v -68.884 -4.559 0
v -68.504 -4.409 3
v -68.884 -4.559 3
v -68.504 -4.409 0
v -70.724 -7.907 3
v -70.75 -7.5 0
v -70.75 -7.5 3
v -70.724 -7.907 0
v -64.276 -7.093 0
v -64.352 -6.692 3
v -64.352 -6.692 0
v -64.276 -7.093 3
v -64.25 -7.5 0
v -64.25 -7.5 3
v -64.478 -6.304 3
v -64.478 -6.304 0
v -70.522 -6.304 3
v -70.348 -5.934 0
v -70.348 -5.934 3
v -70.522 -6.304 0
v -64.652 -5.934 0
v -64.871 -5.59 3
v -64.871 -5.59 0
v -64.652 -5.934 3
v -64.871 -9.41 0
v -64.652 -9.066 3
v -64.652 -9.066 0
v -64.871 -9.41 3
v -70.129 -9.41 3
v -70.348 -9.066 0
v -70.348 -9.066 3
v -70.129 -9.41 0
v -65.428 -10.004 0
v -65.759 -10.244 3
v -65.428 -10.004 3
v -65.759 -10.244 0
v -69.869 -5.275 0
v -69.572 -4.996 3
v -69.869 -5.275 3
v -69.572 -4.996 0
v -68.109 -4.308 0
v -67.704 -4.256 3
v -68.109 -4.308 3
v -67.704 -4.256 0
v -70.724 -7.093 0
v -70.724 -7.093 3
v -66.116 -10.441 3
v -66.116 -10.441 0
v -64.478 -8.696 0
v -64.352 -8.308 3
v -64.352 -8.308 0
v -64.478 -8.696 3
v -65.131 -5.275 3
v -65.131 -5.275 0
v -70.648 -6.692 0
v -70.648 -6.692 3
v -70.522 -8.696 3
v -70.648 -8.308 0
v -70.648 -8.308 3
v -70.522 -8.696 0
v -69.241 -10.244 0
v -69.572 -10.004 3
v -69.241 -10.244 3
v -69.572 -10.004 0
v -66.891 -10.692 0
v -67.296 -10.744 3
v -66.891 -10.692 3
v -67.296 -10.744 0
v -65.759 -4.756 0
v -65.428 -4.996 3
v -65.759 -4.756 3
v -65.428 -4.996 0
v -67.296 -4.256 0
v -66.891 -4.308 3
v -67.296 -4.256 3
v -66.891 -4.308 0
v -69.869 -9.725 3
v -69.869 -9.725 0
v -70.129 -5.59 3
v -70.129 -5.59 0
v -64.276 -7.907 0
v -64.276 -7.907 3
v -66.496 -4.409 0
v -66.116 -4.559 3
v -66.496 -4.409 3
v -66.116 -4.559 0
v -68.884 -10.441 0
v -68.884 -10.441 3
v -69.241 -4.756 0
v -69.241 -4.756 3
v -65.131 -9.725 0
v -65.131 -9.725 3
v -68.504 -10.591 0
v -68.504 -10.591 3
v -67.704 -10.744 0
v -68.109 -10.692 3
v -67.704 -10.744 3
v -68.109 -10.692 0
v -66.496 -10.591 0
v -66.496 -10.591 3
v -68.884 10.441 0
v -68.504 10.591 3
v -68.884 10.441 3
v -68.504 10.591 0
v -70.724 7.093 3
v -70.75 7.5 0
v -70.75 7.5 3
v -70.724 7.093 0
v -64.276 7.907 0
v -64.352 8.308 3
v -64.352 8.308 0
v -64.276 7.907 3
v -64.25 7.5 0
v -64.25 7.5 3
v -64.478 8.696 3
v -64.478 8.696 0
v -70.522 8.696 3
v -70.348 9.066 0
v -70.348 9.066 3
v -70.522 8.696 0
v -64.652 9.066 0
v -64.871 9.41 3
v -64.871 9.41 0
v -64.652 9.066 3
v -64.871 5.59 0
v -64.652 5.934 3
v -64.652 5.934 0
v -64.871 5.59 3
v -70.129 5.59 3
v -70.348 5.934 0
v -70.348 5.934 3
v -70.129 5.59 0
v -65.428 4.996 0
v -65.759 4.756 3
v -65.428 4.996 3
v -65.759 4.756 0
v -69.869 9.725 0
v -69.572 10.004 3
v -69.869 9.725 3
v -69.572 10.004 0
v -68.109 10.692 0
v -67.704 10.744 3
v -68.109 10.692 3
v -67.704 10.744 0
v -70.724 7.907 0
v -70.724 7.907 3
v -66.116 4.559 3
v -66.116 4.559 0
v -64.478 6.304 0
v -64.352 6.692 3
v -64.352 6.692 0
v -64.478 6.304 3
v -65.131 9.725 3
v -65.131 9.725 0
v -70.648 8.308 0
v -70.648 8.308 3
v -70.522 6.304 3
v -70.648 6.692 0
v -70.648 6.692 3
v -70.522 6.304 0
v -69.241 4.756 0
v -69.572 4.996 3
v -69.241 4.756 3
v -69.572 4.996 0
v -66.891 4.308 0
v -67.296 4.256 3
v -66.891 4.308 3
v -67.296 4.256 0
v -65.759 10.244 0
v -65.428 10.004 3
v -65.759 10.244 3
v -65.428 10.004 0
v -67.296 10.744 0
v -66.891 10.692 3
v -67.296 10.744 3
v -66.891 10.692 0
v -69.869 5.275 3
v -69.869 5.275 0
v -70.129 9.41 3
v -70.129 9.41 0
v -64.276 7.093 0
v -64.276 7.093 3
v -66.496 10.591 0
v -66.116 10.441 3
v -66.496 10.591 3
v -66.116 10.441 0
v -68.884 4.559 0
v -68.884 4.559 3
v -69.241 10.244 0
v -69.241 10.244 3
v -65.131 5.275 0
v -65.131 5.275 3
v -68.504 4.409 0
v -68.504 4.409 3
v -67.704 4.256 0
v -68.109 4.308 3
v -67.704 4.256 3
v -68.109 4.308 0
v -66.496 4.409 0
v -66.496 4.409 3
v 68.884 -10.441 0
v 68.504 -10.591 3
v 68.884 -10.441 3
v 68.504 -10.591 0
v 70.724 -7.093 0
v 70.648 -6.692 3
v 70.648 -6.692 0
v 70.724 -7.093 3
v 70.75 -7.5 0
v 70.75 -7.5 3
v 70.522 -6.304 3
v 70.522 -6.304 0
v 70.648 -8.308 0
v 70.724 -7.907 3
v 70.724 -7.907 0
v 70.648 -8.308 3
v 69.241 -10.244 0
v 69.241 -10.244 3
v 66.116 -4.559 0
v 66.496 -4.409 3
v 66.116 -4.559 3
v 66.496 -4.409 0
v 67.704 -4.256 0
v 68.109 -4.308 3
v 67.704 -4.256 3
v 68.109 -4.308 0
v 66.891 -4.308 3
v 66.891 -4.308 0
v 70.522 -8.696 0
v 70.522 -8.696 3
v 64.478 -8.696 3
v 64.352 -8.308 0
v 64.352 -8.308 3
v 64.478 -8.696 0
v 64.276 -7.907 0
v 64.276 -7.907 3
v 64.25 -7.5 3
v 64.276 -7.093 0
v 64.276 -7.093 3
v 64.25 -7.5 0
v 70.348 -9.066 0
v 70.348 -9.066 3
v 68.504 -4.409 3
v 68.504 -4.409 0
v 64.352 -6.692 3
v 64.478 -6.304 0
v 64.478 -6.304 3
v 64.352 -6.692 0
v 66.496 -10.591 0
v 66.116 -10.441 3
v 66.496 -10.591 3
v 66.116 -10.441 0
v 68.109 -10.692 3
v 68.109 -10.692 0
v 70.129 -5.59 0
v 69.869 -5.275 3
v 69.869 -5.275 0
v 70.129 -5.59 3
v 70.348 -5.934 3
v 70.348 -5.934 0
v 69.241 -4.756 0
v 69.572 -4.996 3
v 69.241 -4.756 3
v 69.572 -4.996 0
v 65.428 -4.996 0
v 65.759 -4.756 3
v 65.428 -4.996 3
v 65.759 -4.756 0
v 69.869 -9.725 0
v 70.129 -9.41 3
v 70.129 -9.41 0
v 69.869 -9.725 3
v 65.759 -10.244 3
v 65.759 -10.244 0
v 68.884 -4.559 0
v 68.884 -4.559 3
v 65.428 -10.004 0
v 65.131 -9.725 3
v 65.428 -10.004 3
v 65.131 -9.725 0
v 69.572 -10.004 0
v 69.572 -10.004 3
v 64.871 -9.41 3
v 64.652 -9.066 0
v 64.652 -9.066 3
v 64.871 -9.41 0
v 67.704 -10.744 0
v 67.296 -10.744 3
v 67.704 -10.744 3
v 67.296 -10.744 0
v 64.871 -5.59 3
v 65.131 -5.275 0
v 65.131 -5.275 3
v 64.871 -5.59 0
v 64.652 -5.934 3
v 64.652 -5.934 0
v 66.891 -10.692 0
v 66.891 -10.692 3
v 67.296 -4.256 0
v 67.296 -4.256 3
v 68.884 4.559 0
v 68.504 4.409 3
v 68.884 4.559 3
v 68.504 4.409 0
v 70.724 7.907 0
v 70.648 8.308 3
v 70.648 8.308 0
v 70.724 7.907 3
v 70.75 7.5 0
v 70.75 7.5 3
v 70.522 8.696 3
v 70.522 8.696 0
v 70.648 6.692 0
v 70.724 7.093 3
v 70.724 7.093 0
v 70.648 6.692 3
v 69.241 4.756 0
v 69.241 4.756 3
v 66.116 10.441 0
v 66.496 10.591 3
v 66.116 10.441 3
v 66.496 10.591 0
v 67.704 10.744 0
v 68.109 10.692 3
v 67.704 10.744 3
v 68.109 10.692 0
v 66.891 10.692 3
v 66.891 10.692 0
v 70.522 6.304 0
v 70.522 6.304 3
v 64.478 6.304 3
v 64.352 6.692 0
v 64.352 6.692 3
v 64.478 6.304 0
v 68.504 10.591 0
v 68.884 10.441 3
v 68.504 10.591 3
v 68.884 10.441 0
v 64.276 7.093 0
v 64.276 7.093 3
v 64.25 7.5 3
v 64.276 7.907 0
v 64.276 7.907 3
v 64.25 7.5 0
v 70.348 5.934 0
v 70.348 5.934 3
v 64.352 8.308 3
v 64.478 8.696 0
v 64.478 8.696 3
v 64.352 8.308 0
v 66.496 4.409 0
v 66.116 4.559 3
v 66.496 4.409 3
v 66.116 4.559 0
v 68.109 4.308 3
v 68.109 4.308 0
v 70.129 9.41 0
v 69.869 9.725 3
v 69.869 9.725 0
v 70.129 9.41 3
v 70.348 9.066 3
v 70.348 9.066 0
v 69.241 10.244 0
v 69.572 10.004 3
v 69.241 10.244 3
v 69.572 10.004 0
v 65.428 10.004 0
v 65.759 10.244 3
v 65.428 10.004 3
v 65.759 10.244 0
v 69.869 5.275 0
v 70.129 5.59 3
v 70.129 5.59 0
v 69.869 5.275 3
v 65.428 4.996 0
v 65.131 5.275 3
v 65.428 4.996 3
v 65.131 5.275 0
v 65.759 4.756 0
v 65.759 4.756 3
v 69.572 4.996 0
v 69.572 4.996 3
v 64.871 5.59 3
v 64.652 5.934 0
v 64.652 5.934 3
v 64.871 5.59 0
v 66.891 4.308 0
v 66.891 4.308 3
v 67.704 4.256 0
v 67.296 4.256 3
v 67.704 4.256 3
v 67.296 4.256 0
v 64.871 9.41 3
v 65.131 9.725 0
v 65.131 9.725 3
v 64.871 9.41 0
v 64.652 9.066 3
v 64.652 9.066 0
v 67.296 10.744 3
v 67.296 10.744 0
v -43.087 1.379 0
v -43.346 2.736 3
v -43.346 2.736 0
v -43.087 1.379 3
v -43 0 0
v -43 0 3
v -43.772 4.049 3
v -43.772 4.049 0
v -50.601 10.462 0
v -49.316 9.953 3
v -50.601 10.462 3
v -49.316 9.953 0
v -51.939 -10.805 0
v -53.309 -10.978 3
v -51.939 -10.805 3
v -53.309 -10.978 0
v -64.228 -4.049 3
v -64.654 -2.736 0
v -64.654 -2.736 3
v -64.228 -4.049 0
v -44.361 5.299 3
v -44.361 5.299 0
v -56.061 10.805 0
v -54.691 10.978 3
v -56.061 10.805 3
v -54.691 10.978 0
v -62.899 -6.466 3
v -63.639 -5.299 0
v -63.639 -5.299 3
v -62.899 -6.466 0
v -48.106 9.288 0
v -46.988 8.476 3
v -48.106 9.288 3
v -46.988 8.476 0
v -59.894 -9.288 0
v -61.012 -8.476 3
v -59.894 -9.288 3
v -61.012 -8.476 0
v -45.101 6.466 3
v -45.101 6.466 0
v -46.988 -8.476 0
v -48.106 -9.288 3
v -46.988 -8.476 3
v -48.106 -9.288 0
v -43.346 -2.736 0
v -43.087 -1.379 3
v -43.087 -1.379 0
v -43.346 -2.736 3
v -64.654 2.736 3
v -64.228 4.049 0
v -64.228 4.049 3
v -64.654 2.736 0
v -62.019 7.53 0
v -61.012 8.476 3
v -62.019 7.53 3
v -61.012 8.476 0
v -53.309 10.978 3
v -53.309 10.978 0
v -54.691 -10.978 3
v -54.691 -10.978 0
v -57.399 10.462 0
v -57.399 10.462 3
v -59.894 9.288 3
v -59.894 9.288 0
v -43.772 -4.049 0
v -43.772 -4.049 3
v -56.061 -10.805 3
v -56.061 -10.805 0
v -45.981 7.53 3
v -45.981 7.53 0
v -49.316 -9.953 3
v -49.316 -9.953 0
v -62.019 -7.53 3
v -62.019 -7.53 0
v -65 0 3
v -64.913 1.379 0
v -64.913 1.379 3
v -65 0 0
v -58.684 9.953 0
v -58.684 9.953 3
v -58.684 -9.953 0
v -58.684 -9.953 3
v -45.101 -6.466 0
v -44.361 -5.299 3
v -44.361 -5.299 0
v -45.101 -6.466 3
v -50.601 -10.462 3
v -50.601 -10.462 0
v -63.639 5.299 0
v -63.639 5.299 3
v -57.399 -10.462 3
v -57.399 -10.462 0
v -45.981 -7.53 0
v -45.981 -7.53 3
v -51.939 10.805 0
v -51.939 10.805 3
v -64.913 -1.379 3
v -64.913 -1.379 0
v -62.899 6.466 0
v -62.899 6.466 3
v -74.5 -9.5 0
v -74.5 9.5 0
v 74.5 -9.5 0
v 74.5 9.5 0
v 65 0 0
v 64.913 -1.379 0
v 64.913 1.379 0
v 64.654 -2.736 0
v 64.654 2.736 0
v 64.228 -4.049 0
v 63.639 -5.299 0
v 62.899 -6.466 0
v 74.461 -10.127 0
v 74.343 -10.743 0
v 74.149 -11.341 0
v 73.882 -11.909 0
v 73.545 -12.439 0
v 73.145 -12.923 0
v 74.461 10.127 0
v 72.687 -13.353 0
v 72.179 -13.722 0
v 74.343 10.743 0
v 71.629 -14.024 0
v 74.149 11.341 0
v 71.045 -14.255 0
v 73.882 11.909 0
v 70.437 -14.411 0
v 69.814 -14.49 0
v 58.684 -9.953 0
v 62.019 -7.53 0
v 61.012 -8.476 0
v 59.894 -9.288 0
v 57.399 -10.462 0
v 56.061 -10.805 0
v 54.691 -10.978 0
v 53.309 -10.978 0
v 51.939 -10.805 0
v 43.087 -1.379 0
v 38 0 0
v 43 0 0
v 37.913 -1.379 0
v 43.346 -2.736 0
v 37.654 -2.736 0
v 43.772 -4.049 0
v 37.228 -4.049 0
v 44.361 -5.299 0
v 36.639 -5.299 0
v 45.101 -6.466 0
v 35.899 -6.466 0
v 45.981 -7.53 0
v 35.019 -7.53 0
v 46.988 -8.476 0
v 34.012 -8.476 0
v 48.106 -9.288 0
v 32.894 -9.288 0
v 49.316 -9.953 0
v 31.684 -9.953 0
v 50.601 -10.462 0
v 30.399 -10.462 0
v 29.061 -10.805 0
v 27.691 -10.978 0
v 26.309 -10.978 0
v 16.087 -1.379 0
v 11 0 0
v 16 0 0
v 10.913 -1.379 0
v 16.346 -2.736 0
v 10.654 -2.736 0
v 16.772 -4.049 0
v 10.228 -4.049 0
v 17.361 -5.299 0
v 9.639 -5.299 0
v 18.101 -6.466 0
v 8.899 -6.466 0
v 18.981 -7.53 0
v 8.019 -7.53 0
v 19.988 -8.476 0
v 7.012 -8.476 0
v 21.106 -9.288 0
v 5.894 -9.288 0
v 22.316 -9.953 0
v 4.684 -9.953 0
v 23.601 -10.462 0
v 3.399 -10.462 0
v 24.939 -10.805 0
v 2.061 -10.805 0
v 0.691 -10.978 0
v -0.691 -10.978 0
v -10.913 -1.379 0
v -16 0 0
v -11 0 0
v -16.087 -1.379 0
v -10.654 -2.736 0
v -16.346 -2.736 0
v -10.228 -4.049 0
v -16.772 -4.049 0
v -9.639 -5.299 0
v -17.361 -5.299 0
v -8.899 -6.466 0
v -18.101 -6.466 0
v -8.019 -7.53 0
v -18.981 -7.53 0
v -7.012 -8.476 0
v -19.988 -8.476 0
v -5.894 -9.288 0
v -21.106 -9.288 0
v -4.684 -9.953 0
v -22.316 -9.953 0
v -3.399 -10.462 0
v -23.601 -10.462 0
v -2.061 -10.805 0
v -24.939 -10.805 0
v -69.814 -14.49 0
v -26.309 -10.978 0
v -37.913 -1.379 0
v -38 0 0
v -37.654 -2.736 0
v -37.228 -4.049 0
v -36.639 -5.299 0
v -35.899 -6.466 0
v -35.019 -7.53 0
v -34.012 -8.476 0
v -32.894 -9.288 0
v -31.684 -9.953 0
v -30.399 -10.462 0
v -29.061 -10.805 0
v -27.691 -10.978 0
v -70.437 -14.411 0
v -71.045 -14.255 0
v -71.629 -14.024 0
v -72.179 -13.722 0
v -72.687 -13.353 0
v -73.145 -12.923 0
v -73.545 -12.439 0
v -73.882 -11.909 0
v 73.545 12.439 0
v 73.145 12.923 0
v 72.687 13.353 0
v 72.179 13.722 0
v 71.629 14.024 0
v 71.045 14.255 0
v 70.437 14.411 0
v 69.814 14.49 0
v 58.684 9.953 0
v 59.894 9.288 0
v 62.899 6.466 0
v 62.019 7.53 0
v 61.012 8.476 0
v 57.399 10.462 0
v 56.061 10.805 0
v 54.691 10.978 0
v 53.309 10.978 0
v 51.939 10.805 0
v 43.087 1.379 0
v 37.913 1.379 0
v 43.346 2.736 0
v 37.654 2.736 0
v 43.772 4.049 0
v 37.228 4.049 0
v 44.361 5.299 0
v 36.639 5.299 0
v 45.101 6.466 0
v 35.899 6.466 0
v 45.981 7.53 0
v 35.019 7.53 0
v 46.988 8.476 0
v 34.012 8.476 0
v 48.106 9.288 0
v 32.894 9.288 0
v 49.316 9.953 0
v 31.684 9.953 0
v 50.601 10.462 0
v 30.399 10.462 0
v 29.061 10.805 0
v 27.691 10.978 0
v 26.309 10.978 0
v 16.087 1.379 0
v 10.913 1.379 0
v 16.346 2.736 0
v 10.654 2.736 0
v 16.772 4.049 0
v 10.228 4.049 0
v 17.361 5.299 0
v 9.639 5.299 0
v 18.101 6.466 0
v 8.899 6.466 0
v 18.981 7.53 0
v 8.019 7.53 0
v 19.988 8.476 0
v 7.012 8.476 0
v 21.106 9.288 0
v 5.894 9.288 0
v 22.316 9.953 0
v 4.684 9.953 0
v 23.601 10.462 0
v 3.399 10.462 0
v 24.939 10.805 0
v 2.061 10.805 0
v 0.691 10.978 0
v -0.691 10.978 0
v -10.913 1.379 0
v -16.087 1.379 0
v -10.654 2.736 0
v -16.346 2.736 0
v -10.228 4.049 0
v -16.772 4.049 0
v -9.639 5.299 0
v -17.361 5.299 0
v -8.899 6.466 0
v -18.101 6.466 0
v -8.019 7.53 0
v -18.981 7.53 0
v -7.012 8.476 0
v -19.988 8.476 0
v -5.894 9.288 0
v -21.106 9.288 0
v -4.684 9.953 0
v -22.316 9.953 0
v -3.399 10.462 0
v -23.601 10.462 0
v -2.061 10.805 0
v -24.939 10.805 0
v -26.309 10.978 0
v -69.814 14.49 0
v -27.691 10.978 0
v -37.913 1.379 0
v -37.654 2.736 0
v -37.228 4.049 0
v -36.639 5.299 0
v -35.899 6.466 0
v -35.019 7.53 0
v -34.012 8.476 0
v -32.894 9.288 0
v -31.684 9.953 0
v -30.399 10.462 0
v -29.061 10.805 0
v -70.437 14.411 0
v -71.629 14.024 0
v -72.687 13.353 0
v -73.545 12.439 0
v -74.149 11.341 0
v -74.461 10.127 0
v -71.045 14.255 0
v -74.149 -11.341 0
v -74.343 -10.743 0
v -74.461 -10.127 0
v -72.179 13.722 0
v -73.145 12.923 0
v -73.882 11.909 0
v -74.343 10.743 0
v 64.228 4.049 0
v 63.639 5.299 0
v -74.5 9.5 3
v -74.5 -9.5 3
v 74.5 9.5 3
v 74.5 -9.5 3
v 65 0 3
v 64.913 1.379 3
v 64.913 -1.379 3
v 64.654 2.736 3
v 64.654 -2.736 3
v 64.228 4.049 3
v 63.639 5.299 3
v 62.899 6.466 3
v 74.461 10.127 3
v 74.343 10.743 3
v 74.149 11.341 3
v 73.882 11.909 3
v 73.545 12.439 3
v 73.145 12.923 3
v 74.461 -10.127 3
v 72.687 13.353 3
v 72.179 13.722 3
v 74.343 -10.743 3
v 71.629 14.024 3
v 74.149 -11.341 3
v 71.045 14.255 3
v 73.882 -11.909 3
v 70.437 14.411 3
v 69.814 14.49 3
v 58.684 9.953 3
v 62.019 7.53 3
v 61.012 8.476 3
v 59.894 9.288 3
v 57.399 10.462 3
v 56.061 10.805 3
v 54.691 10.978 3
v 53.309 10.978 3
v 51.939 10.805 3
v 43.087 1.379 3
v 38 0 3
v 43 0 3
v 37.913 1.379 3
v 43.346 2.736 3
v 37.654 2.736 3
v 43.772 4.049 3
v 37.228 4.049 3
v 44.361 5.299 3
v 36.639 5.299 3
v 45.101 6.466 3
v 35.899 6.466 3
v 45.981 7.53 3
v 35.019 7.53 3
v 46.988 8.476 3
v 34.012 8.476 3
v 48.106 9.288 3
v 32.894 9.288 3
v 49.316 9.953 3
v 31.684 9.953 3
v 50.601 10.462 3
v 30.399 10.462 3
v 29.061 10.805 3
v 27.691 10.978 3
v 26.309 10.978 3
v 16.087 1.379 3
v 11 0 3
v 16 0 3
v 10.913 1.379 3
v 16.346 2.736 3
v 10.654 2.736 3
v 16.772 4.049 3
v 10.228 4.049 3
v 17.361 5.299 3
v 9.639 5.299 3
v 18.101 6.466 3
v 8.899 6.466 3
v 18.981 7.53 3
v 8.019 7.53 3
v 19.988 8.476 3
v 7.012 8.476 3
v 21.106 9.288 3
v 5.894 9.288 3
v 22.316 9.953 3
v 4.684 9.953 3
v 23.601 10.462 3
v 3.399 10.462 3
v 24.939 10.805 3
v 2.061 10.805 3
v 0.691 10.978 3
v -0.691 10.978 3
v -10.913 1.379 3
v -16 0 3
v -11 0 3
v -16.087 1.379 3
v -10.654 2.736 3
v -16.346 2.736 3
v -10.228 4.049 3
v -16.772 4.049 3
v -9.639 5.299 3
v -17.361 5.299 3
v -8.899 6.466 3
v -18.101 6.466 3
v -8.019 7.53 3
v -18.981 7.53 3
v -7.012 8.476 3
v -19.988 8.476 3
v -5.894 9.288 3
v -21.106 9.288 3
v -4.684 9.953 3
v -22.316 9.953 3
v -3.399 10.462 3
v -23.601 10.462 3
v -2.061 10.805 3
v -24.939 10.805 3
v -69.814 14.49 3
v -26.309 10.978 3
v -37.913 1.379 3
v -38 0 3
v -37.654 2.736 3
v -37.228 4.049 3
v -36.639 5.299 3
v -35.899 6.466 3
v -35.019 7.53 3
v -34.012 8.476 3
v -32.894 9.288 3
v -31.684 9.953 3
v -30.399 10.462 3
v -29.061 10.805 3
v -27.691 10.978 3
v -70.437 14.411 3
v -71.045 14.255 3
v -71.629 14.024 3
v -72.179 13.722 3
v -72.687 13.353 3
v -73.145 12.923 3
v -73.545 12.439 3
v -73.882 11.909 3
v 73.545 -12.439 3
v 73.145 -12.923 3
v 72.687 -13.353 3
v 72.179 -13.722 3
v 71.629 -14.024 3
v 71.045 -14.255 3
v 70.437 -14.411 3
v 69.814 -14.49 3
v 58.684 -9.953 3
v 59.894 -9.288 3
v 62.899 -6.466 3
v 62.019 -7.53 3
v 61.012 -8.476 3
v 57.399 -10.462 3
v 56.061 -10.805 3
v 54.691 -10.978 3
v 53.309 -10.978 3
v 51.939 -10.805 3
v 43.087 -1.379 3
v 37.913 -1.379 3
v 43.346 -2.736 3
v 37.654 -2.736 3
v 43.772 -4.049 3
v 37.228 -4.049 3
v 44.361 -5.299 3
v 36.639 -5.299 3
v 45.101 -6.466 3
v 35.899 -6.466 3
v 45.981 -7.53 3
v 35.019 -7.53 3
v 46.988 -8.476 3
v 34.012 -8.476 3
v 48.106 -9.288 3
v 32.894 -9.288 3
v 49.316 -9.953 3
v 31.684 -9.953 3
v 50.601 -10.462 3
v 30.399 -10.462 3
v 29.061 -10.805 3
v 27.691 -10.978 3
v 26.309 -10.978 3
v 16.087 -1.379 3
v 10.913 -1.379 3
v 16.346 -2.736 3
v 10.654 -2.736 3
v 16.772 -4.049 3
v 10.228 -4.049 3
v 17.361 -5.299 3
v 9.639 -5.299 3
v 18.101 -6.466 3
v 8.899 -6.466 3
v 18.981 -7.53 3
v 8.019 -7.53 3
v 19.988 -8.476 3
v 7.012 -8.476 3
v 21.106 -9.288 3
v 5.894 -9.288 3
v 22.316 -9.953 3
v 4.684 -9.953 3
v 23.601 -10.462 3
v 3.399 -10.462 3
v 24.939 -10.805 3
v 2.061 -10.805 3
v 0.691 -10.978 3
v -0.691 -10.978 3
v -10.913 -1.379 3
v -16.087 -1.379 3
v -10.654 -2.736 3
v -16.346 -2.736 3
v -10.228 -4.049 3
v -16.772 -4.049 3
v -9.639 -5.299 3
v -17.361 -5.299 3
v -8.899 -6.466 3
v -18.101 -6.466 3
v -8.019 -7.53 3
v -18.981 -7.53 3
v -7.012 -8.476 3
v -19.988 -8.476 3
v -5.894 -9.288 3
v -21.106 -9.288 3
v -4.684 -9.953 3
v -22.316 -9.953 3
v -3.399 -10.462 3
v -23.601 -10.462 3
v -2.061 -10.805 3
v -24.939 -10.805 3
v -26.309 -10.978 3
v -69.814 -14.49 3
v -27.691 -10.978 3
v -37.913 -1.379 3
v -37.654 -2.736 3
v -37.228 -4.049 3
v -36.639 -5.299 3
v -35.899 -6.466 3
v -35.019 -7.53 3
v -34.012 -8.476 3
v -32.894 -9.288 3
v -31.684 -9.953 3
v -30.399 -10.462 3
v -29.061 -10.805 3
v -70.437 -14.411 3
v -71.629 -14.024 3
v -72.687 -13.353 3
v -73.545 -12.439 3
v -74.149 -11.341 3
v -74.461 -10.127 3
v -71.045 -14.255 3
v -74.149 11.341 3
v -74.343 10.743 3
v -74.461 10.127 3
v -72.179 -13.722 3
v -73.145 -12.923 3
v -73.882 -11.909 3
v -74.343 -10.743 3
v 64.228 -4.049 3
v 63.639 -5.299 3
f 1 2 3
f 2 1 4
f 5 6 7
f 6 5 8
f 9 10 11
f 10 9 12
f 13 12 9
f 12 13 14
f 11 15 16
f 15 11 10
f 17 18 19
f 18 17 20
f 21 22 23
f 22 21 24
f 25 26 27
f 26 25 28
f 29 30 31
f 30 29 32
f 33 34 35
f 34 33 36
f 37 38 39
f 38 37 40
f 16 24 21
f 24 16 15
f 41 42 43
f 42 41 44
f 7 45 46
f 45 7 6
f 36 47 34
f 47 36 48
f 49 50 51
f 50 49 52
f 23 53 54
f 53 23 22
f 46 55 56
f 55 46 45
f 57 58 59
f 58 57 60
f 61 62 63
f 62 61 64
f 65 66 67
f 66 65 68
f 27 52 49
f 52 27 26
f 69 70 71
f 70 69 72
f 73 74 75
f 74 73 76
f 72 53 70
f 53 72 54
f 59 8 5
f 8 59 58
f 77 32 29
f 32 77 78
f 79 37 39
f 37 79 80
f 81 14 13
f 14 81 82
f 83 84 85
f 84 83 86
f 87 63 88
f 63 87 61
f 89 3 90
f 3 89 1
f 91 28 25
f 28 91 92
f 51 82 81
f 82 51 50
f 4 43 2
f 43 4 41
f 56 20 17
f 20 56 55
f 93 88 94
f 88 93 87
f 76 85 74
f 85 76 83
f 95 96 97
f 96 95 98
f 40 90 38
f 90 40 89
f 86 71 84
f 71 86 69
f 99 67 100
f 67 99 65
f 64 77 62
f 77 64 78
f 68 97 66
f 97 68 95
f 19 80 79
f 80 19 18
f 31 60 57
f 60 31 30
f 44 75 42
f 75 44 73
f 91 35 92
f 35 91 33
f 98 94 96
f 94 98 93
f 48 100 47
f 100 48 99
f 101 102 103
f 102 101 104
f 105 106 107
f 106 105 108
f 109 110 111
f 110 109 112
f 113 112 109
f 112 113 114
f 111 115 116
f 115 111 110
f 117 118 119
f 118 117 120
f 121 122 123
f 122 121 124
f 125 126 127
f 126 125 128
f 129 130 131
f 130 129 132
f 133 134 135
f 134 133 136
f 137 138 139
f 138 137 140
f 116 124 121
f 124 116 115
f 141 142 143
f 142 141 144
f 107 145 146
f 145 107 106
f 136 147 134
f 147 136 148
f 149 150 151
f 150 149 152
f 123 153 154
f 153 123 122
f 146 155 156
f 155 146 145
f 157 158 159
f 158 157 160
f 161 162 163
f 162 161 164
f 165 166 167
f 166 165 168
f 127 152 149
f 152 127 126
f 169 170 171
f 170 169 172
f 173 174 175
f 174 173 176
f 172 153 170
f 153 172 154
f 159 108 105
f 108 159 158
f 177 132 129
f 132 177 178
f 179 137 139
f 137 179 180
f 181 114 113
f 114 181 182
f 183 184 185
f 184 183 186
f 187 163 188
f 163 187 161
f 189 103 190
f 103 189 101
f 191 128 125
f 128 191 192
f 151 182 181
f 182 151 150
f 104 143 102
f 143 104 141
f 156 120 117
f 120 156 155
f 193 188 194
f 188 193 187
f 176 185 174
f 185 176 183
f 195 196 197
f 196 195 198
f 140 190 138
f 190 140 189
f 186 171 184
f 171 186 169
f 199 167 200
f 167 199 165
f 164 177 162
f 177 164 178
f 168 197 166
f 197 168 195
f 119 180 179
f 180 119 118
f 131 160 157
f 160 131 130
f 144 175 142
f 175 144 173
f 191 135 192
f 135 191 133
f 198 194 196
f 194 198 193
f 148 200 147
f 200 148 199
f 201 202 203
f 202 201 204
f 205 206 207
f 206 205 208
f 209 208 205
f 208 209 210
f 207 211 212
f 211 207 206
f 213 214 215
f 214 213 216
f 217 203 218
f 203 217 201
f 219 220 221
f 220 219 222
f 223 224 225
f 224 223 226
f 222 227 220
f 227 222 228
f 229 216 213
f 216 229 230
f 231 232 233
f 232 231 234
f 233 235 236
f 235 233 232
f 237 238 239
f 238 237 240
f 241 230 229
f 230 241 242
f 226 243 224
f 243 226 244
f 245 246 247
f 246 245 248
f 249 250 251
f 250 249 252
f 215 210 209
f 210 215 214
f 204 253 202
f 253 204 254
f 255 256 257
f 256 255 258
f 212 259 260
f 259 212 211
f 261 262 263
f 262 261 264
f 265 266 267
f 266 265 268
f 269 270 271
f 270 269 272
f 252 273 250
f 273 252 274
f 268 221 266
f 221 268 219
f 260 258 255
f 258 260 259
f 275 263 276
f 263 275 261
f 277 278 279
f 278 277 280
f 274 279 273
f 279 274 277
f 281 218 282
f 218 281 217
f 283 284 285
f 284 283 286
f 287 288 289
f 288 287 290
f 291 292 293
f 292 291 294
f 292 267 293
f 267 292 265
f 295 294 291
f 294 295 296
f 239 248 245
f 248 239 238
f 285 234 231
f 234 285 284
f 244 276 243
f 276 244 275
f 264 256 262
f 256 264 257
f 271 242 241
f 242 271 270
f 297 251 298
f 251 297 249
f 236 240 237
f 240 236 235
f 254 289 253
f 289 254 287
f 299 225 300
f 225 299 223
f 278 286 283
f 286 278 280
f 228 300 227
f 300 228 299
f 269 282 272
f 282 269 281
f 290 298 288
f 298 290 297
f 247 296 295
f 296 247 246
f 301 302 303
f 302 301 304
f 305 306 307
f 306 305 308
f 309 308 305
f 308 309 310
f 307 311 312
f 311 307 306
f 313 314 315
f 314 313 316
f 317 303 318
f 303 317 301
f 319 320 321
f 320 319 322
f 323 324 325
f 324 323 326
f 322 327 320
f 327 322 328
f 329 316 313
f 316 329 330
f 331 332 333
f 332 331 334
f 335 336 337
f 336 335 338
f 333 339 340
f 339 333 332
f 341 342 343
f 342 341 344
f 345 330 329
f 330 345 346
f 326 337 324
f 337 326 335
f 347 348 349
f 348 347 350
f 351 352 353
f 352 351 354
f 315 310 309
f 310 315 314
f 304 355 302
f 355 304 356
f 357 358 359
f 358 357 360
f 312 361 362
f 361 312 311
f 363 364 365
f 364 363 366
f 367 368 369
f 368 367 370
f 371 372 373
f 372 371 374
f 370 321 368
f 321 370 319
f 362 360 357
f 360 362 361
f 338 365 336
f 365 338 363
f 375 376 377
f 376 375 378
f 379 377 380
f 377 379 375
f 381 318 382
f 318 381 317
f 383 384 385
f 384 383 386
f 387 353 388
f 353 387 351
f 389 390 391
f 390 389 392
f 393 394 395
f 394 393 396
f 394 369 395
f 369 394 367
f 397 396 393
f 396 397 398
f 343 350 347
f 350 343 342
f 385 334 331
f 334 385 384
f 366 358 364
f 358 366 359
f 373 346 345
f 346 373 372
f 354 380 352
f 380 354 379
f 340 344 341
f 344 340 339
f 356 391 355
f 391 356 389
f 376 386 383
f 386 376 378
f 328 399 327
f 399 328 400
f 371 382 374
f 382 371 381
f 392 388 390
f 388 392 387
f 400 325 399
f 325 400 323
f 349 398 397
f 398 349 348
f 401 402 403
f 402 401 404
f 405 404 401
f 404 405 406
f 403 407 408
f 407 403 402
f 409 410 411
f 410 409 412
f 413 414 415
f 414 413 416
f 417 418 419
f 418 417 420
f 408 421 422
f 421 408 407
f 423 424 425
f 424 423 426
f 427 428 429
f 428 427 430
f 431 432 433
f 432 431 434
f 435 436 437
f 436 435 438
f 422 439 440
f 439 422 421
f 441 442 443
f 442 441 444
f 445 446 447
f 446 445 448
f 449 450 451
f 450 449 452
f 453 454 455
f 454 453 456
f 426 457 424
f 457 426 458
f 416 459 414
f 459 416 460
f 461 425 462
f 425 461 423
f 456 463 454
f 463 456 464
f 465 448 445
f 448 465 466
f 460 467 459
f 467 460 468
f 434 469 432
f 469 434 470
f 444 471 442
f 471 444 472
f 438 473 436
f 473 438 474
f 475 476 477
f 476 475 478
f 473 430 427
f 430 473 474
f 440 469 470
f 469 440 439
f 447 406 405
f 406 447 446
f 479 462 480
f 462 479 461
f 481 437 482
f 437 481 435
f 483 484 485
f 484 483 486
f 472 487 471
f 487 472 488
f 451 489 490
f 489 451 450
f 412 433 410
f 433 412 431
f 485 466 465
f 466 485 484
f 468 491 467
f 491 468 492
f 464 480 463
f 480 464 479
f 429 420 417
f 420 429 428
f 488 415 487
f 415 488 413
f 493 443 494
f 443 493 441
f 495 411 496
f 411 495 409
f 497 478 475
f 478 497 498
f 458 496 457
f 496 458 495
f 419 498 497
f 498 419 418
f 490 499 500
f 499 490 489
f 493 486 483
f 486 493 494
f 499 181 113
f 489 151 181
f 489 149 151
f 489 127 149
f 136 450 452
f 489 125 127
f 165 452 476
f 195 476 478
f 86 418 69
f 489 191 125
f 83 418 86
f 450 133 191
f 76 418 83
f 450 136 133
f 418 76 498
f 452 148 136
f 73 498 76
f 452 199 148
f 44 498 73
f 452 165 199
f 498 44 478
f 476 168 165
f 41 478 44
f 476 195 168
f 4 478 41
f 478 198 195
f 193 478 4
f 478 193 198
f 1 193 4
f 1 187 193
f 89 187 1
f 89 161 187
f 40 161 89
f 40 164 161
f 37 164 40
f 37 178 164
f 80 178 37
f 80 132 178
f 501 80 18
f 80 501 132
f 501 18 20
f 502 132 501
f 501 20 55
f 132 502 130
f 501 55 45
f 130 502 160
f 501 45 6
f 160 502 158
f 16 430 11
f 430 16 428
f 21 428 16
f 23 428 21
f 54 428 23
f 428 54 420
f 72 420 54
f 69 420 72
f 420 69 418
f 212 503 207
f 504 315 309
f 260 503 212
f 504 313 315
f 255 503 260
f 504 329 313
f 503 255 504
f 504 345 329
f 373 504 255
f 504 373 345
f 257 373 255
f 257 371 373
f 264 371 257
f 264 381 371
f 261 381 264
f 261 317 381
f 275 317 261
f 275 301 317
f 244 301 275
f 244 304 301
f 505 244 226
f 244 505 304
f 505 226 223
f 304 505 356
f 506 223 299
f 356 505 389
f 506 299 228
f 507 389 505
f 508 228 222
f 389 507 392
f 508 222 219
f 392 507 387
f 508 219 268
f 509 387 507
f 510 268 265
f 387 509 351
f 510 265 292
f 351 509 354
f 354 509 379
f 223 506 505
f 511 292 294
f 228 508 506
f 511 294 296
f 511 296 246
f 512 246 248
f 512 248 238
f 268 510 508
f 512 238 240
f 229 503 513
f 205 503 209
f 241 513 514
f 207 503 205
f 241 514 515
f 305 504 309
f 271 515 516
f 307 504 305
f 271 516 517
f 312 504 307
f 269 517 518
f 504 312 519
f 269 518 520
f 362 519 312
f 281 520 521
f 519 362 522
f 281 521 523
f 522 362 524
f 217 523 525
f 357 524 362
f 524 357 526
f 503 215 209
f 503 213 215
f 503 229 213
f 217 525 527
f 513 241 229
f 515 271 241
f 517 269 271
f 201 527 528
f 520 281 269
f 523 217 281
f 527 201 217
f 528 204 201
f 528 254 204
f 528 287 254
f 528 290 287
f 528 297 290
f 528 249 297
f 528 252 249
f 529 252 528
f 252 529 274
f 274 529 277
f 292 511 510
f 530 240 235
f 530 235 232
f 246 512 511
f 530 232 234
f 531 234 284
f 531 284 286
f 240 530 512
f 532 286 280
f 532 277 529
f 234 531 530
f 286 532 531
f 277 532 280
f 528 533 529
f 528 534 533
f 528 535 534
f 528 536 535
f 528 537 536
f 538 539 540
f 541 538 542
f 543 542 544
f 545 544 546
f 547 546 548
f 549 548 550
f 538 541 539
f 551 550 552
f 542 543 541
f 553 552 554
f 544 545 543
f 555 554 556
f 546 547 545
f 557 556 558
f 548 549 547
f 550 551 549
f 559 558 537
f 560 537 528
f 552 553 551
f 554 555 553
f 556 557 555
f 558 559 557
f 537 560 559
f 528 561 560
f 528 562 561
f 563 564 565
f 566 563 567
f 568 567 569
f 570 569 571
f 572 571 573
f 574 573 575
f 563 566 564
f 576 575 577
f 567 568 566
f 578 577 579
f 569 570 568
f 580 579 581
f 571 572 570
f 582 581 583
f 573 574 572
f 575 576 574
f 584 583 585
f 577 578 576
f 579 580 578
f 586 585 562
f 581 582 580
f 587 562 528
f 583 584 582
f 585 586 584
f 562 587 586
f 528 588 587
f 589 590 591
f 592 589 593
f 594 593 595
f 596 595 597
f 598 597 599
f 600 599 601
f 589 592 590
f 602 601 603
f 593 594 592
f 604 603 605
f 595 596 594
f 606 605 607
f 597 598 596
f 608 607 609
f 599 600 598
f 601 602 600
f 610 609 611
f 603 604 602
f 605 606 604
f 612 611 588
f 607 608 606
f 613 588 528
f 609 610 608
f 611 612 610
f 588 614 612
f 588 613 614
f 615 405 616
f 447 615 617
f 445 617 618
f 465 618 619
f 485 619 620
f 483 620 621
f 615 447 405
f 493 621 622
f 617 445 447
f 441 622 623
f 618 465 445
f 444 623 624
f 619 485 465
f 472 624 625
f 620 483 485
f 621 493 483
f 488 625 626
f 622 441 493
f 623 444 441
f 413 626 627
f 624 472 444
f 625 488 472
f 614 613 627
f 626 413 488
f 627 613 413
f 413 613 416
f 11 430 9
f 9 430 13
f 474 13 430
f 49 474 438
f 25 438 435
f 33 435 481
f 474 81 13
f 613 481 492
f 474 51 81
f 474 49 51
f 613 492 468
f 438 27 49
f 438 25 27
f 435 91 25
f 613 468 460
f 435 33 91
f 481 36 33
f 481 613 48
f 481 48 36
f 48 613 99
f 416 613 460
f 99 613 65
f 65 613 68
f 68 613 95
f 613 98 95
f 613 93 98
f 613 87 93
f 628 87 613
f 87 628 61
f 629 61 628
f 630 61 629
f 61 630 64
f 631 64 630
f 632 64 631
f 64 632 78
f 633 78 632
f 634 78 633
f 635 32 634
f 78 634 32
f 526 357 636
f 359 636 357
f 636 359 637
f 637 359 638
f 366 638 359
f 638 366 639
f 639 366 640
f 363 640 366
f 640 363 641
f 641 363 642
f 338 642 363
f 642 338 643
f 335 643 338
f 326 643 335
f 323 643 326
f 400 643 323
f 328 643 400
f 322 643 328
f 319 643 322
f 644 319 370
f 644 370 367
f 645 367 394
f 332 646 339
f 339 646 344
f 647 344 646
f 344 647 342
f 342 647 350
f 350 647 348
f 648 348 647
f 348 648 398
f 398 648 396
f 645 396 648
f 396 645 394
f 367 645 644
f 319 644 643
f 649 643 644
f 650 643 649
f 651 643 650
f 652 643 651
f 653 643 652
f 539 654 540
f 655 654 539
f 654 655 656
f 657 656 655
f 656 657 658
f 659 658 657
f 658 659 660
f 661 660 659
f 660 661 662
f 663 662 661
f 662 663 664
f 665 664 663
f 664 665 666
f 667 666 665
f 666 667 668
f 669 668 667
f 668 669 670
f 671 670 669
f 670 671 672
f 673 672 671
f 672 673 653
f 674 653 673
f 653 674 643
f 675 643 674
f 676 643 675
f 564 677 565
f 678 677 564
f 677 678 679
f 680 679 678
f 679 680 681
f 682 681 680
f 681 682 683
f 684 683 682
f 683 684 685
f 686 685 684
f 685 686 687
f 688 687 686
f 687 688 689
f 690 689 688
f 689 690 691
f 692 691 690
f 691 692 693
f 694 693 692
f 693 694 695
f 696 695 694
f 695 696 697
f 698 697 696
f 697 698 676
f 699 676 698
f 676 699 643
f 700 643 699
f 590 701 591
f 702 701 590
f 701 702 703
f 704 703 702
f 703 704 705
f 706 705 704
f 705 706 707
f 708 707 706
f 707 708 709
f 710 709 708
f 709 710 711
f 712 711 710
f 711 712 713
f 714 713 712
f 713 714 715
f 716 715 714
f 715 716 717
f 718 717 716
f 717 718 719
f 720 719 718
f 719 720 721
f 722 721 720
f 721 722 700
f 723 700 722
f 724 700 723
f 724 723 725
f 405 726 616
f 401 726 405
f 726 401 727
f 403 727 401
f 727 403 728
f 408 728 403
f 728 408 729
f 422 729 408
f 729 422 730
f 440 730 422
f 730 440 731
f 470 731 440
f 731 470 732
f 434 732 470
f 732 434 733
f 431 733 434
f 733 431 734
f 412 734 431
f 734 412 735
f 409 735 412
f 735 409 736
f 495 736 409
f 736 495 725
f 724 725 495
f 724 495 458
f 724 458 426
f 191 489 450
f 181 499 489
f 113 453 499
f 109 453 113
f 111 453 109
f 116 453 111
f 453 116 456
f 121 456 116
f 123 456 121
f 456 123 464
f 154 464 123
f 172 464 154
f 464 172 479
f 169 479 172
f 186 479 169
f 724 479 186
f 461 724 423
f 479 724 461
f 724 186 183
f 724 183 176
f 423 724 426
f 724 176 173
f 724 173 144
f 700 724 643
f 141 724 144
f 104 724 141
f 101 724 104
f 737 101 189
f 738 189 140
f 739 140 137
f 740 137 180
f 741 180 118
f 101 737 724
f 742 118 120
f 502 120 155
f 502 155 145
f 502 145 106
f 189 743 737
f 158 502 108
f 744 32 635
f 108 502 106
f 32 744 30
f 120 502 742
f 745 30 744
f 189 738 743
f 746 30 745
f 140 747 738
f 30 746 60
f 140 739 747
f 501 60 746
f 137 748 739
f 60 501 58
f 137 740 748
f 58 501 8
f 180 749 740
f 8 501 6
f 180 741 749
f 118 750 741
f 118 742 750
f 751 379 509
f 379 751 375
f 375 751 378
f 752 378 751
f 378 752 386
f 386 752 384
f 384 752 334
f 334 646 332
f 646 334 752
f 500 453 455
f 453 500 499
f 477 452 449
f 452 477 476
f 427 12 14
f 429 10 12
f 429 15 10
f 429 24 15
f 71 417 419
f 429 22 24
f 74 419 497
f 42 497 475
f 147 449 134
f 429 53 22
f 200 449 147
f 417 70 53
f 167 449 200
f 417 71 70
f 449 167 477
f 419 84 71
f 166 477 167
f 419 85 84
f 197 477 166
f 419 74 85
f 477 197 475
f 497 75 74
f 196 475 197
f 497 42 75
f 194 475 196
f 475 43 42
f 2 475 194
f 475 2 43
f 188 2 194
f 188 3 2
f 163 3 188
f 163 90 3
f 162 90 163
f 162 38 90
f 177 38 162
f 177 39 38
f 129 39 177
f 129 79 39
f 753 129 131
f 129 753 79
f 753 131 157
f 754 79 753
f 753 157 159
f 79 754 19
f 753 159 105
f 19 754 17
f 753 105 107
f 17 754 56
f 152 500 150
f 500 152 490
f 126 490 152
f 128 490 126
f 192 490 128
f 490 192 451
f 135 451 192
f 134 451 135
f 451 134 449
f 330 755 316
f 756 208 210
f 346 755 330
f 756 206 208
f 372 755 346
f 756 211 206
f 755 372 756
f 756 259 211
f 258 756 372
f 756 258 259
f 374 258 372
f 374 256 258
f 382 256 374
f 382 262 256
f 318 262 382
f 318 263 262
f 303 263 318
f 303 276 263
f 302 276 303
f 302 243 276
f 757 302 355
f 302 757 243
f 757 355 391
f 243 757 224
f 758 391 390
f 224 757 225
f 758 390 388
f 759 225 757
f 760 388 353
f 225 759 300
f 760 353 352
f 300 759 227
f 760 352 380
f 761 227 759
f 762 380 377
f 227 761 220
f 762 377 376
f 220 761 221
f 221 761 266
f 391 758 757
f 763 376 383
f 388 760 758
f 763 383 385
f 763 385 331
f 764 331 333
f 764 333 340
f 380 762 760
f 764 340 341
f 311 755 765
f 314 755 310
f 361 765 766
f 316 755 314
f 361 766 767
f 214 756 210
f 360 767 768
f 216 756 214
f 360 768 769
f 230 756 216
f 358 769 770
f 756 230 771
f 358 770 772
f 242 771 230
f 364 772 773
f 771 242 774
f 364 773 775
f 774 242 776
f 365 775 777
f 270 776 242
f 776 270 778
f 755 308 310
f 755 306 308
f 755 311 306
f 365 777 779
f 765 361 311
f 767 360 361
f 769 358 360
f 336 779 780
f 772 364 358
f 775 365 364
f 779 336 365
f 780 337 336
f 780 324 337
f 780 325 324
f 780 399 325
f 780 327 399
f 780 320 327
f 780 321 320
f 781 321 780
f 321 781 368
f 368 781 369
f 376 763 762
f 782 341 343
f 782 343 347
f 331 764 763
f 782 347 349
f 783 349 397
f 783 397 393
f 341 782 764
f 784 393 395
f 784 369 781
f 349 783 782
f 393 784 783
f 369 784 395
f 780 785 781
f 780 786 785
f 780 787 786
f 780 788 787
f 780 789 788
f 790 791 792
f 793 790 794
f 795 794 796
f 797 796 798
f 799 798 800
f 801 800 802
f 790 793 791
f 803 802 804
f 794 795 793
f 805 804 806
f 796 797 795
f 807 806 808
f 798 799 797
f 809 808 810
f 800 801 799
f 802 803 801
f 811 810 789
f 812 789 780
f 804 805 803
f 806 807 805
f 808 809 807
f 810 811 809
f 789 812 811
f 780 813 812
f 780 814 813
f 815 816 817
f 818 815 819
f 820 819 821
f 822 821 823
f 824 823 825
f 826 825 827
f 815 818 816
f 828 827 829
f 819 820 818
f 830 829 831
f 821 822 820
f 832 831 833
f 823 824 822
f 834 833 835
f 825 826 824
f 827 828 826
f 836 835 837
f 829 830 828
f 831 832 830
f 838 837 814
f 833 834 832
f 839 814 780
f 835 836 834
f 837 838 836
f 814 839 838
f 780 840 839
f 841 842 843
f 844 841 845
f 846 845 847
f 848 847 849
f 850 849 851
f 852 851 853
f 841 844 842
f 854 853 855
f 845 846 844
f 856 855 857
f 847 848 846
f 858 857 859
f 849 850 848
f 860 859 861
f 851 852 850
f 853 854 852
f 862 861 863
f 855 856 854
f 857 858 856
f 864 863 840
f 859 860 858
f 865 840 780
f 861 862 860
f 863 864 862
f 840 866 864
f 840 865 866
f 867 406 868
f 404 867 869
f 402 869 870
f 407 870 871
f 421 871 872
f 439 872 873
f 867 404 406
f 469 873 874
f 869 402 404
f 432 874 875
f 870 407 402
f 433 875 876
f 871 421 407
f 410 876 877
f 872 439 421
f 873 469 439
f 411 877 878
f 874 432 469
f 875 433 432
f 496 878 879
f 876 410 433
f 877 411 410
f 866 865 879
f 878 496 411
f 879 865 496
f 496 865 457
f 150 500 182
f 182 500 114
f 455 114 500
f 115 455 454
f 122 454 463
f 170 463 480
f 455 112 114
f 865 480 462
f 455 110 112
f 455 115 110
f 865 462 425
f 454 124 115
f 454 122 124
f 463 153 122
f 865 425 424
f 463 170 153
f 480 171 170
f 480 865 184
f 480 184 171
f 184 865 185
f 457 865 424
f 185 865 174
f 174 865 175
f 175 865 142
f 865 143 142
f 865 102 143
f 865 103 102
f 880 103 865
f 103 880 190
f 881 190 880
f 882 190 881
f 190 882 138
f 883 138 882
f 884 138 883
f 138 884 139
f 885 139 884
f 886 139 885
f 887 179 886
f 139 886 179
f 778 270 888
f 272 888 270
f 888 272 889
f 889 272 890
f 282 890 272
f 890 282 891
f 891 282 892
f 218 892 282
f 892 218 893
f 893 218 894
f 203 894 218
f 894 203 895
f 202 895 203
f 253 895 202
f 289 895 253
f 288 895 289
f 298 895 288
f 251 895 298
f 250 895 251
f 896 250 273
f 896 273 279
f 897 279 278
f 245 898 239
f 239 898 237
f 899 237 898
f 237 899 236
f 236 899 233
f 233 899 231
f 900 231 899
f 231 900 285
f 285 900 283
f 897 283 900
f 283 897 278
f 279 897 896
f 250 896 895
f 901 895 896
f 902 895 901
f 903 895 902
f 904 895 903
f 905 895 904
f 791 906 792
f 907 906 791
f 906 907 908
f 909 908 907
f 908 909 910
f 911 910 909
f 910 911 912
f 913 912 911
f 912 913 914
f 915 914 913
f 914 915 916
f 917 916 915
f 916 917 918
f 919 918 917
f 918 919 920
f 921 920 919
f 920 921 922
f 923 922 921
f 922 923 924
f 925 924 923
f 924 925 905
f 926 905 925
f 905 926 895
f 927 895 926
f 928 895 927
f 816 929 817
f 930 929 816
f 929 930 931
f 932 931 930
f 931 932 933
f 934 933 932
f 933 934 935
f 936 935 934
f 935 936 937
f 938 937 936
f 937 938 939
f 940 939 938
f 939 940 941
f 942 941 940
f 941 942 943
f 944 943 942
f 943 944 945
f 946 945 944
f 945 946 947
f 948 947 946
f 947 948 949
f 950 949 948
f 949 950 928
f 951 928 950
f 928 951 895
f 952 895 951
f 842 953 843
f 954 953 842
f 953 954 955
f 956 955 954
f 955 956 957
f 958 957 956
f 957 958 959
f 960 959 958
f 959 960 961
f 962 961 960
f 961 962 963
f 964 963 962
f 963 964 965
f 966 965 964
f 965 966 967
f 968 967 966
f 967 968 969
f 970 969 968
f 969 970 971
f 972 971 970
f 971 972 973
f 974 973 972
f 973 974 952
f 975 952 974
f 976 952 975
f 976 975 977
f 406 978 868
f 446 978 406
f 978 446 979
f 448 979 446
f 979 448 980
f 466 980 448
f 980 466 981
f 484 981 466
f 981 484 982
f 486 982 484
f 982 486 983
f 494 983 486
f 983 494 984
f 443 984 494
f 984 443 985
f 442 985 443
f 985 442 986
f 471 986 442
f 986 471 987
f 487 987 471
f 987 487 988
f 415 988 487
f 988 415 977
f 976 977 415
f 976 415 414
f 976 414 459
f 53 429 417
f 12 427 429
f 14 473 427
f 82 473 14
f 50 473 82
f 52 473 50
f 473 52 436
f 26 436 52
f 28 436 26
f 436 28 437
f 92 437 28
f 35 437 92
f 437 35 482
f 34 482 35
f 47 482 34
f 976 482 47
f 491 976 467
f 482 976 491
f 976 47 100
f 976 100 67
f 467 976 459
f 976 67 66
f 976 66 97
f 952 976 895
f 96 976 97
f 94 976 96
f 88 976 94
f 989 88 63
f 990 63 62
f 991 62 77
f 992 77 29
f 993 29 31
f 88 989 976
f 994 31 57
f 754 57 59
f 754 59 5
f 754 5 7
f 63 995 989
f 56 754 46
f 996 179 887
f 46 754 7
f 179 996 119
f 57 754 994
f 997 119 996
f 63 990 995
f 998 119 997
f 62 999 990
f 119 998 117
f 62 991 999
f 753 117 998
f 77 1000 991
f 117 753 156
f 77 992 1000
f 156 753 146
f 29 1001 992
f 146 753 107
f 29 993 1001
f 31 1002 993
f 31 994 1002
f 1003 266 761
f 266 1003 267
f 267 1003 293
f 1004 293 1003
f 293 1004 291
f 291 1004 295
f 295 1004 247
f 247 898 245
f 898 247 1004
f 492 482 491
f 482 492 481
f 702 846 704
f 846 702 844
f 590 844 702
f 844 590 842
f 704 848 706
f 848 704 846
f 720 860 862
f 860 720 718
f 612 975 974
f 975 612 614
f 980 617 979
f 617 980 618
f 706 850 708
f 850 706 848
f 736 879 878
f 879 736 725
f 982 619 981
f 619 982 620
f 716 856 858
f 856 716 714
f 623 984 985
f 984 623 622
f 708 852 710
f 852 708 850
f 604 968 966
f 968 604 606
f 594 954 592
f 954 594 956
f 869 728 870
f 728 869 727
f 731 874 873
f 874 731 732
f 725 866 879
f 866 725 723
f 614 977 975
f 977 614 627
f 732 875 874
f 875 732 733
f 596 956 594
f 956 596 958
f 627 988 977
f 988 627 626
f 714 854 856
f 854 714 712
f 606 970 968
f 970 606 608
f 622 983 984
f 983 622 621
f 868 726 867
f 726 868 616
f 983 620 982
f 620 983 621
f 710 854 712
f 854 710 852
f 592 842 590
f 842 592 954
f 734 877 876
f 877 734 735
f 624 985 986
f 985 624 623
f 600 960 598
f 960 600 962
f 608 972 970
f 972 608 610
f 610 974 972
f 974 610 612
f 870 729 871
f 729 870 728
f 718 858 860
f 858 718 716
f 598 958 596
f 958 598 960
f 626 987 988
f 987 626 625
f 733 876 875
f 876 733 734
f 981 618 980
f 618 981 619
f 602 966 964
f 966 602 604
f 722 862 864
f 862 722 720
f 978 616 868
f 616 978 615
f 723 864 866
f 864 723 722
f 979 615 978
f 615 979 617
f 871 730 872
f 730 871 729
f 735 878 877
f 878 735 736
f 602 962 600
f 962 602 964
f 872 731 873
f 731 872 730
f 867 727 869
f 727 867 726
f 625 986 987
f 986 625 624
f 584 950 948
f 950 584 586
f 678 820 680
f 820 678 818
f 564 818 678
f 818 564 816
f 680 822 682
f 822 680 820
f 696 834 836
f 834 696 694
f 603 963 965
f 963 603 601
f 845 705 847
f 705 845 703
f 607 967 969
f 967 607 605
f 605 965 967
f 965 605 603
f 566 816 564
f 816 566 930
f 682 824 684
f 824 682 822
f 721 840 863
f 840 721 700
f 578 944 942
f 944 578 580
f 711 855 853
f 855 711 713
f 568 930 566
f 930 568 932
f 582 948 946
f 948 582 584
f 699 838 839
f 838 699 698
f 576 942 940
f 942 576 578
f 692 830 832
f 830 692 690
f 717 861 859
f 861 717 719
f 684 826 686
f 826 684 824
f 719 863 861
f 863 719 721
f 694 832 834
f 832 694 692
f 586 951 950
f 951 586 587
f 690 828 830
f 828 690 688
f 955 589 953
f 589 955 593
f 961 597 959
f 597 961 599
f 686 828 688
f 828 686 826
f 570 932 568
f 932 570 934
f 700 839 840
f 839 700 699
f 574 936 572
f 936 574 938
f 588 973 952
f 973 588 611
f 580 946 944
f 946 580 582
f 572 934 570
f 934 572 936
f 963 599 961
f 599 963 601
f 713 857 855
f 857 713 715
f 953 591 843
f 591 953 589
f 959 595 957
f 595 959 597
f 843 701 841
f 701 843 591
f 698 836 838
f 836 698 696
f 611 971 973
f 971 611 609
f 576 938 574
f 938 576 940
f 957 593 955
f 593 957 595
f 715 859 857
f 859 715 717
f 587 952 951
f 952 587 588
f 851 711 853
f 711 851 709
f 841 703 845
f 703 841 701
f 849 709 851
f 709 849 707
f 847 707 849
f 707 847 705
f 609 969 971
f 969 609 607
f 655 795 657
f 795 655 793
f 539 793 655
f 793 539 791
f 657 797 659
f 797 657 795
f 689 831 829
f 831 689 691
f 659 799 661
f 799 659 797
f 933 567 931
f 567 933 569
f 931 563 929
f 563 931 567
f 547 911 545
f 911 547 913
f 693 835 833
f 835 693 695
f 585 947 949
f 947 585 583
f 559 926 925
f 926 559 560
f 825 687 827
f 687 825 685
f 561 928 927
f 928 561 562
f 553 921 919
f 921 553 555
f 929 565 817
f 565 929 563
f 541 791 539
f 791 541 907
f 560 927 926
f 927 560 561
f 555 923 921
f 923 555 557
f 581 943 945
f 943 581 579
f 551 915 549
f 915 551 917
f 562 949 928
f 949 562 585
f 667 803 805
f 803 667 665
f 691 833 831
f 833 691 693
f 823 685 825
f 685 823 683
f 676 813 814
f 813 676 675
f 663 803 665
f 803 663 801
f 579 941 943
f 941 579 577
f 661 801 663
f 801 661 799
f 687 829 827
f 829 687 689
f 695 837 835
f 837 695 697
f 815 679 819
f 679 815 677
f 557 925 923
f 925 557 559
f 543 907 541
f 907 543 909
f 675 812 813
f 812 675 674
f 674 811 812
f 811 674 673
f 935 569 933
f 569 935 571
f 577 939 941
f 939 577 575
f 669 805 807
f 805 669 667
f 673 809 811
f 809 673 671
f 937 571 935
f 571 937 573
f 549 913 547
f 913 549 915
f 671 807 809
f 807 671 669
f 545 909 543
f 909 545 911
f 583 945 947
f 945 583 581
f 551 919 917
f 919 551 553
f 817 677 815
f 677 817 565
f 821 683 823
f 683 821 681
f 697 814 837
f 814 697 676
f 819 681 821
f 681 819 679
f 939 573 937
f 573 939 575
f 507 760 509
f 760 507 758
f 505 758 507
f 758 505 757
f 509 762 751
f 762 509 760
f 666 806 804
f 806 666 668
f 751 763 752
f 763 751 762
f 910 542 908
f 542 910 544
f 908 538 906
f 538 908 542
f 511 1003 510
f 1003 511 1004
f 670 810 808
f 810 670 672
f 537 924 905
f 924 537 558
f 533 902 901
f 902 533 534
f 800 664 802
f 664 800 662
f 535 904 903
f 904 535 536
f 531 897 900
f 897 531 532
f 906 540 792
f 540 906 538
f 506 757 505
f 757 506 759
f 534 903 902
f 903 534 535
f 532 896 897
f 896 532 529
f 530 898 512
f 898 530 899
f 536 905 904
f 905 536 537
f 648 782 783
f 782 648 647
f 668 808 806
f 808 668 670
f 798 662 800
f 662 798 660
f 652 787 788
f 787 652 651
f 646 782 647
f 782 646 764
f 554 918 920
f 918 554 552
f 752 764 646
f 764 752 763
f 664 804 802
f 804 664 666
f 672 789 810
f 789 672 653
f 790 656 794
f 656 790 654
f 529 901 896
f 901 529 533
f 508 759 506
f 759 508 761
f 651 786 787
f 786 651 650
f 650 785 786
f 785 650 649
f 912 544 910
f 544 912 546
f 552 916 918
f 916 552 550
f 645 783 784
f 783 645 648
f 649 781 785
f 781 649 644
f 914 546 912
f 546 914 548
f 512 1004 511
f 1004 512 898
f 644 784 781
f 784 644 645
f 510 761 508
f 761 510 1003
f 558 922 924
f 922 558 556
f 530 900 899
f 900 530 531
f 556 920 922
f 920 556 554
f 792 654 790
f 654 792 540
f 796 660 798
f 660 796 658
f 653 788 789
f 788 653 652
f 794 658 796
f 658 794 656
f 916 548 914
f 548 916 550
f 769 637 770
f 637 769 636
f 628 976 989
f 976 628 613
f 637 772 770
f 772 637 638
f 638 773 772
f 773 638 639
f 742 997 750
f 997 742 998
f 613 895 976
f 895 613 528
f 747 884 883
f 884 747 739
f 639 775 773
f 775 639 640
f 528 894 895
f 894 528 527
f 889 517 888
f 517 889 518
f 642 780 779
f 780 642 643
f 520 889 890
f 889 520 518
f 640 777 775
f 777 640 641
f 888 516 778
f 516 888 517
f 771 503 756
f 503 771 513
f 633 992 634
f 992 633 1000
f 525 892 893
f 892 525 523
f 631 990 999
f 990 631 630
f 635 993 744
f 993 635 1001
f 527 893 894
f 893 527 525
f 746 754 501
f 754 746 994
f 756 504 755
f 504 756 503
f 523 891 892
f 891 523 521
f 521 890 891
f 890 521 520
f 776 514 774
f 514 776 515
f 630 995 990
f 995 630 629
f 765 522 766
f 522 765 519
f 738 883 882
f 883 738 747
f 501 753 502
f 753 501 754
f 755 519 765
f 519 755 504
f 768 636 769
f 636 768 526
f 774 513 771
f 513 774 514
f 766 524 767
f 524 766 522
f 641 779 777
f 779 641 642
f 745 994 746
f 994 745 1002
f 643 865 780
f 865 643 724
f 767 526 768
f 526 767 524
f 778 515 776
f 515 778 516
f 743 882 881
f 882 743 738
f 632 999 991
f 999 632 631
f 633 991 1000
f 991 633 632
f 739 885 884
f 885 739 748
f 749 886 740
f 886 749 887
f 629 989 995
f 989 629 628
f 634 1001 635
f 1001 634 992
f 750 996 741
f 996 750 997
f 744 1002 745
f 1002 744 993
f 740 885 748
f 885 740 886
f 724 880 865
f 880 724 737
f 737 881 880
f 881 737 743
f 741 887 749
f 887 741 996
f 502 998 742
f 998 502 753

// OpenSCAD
$fn = 50;

difference() {
	union() {
		hull() {
			translate(v = [-69.5, 9.5, 0]) {
				cylinder(h = 3, r = 5);
			}
			translate(v = [69.5, 9.5, 0]) {
				cylinder(h = 3, r = 5);
			}
			translate(v = [-69.5, -9.5, 0]) {
				cylinder(h = 3, r = 5);
			}
			translate(v = [69.5, -9.5, 0]) {
				cylinder(h = 3, r = 5);
			}
		}
	}
	union() {
		translate(v = [-67.5, -7.5, -100.0]) {
			cylinder(h = 200, r = 3.25);
		}
		translate(v = [-67.5, 7.5, -100.0]) {
			cylinder(h = 200, r = 3.25);
		}
		translate(v = [67.5, -7.5, -100.0]) {
			cylinder(h = 200, r = 3.25);
		}
		translate(v = [67.5, 7.5, -100.0]) {
			cylinder(h = 200, r = 3.25);
		}
		translate(v = [-67.5, -7.5, -100.0]) {
			cylinder(h = 200, r = 1.8);
		}
		translate(v = [-67.5, 7.5, -100.0]) {
			cylinder(h = 200, r = 1.8);
		}
		translate(v = [67.5, -7.5, -100.0]) {
			cylinder(h = 200, r = 1.8);
		}
		translate(v = [67.5, 7.5, -100.0]) {
			cylinder(h = 200, r = 1.8);
		}
		translate(v = [-54.0, 0, 0.0]) {
			cylinder(h = 3, r = 11.0);
		}
		translate(v = [-27.0, 0, 0.0]) {
			cylinder(h = 3, r = 11.0);
		}
		cylinder(h = 3, r = 11.0);
		translate(v = [27.0, 0, 0.0]) {
			cylinder(h = 3, r = 11.0);
		}
		translate(v = [54.0, 0, 0.0]) {
			cylinder(h = 3, r = 11.0);
		}
	}
}
